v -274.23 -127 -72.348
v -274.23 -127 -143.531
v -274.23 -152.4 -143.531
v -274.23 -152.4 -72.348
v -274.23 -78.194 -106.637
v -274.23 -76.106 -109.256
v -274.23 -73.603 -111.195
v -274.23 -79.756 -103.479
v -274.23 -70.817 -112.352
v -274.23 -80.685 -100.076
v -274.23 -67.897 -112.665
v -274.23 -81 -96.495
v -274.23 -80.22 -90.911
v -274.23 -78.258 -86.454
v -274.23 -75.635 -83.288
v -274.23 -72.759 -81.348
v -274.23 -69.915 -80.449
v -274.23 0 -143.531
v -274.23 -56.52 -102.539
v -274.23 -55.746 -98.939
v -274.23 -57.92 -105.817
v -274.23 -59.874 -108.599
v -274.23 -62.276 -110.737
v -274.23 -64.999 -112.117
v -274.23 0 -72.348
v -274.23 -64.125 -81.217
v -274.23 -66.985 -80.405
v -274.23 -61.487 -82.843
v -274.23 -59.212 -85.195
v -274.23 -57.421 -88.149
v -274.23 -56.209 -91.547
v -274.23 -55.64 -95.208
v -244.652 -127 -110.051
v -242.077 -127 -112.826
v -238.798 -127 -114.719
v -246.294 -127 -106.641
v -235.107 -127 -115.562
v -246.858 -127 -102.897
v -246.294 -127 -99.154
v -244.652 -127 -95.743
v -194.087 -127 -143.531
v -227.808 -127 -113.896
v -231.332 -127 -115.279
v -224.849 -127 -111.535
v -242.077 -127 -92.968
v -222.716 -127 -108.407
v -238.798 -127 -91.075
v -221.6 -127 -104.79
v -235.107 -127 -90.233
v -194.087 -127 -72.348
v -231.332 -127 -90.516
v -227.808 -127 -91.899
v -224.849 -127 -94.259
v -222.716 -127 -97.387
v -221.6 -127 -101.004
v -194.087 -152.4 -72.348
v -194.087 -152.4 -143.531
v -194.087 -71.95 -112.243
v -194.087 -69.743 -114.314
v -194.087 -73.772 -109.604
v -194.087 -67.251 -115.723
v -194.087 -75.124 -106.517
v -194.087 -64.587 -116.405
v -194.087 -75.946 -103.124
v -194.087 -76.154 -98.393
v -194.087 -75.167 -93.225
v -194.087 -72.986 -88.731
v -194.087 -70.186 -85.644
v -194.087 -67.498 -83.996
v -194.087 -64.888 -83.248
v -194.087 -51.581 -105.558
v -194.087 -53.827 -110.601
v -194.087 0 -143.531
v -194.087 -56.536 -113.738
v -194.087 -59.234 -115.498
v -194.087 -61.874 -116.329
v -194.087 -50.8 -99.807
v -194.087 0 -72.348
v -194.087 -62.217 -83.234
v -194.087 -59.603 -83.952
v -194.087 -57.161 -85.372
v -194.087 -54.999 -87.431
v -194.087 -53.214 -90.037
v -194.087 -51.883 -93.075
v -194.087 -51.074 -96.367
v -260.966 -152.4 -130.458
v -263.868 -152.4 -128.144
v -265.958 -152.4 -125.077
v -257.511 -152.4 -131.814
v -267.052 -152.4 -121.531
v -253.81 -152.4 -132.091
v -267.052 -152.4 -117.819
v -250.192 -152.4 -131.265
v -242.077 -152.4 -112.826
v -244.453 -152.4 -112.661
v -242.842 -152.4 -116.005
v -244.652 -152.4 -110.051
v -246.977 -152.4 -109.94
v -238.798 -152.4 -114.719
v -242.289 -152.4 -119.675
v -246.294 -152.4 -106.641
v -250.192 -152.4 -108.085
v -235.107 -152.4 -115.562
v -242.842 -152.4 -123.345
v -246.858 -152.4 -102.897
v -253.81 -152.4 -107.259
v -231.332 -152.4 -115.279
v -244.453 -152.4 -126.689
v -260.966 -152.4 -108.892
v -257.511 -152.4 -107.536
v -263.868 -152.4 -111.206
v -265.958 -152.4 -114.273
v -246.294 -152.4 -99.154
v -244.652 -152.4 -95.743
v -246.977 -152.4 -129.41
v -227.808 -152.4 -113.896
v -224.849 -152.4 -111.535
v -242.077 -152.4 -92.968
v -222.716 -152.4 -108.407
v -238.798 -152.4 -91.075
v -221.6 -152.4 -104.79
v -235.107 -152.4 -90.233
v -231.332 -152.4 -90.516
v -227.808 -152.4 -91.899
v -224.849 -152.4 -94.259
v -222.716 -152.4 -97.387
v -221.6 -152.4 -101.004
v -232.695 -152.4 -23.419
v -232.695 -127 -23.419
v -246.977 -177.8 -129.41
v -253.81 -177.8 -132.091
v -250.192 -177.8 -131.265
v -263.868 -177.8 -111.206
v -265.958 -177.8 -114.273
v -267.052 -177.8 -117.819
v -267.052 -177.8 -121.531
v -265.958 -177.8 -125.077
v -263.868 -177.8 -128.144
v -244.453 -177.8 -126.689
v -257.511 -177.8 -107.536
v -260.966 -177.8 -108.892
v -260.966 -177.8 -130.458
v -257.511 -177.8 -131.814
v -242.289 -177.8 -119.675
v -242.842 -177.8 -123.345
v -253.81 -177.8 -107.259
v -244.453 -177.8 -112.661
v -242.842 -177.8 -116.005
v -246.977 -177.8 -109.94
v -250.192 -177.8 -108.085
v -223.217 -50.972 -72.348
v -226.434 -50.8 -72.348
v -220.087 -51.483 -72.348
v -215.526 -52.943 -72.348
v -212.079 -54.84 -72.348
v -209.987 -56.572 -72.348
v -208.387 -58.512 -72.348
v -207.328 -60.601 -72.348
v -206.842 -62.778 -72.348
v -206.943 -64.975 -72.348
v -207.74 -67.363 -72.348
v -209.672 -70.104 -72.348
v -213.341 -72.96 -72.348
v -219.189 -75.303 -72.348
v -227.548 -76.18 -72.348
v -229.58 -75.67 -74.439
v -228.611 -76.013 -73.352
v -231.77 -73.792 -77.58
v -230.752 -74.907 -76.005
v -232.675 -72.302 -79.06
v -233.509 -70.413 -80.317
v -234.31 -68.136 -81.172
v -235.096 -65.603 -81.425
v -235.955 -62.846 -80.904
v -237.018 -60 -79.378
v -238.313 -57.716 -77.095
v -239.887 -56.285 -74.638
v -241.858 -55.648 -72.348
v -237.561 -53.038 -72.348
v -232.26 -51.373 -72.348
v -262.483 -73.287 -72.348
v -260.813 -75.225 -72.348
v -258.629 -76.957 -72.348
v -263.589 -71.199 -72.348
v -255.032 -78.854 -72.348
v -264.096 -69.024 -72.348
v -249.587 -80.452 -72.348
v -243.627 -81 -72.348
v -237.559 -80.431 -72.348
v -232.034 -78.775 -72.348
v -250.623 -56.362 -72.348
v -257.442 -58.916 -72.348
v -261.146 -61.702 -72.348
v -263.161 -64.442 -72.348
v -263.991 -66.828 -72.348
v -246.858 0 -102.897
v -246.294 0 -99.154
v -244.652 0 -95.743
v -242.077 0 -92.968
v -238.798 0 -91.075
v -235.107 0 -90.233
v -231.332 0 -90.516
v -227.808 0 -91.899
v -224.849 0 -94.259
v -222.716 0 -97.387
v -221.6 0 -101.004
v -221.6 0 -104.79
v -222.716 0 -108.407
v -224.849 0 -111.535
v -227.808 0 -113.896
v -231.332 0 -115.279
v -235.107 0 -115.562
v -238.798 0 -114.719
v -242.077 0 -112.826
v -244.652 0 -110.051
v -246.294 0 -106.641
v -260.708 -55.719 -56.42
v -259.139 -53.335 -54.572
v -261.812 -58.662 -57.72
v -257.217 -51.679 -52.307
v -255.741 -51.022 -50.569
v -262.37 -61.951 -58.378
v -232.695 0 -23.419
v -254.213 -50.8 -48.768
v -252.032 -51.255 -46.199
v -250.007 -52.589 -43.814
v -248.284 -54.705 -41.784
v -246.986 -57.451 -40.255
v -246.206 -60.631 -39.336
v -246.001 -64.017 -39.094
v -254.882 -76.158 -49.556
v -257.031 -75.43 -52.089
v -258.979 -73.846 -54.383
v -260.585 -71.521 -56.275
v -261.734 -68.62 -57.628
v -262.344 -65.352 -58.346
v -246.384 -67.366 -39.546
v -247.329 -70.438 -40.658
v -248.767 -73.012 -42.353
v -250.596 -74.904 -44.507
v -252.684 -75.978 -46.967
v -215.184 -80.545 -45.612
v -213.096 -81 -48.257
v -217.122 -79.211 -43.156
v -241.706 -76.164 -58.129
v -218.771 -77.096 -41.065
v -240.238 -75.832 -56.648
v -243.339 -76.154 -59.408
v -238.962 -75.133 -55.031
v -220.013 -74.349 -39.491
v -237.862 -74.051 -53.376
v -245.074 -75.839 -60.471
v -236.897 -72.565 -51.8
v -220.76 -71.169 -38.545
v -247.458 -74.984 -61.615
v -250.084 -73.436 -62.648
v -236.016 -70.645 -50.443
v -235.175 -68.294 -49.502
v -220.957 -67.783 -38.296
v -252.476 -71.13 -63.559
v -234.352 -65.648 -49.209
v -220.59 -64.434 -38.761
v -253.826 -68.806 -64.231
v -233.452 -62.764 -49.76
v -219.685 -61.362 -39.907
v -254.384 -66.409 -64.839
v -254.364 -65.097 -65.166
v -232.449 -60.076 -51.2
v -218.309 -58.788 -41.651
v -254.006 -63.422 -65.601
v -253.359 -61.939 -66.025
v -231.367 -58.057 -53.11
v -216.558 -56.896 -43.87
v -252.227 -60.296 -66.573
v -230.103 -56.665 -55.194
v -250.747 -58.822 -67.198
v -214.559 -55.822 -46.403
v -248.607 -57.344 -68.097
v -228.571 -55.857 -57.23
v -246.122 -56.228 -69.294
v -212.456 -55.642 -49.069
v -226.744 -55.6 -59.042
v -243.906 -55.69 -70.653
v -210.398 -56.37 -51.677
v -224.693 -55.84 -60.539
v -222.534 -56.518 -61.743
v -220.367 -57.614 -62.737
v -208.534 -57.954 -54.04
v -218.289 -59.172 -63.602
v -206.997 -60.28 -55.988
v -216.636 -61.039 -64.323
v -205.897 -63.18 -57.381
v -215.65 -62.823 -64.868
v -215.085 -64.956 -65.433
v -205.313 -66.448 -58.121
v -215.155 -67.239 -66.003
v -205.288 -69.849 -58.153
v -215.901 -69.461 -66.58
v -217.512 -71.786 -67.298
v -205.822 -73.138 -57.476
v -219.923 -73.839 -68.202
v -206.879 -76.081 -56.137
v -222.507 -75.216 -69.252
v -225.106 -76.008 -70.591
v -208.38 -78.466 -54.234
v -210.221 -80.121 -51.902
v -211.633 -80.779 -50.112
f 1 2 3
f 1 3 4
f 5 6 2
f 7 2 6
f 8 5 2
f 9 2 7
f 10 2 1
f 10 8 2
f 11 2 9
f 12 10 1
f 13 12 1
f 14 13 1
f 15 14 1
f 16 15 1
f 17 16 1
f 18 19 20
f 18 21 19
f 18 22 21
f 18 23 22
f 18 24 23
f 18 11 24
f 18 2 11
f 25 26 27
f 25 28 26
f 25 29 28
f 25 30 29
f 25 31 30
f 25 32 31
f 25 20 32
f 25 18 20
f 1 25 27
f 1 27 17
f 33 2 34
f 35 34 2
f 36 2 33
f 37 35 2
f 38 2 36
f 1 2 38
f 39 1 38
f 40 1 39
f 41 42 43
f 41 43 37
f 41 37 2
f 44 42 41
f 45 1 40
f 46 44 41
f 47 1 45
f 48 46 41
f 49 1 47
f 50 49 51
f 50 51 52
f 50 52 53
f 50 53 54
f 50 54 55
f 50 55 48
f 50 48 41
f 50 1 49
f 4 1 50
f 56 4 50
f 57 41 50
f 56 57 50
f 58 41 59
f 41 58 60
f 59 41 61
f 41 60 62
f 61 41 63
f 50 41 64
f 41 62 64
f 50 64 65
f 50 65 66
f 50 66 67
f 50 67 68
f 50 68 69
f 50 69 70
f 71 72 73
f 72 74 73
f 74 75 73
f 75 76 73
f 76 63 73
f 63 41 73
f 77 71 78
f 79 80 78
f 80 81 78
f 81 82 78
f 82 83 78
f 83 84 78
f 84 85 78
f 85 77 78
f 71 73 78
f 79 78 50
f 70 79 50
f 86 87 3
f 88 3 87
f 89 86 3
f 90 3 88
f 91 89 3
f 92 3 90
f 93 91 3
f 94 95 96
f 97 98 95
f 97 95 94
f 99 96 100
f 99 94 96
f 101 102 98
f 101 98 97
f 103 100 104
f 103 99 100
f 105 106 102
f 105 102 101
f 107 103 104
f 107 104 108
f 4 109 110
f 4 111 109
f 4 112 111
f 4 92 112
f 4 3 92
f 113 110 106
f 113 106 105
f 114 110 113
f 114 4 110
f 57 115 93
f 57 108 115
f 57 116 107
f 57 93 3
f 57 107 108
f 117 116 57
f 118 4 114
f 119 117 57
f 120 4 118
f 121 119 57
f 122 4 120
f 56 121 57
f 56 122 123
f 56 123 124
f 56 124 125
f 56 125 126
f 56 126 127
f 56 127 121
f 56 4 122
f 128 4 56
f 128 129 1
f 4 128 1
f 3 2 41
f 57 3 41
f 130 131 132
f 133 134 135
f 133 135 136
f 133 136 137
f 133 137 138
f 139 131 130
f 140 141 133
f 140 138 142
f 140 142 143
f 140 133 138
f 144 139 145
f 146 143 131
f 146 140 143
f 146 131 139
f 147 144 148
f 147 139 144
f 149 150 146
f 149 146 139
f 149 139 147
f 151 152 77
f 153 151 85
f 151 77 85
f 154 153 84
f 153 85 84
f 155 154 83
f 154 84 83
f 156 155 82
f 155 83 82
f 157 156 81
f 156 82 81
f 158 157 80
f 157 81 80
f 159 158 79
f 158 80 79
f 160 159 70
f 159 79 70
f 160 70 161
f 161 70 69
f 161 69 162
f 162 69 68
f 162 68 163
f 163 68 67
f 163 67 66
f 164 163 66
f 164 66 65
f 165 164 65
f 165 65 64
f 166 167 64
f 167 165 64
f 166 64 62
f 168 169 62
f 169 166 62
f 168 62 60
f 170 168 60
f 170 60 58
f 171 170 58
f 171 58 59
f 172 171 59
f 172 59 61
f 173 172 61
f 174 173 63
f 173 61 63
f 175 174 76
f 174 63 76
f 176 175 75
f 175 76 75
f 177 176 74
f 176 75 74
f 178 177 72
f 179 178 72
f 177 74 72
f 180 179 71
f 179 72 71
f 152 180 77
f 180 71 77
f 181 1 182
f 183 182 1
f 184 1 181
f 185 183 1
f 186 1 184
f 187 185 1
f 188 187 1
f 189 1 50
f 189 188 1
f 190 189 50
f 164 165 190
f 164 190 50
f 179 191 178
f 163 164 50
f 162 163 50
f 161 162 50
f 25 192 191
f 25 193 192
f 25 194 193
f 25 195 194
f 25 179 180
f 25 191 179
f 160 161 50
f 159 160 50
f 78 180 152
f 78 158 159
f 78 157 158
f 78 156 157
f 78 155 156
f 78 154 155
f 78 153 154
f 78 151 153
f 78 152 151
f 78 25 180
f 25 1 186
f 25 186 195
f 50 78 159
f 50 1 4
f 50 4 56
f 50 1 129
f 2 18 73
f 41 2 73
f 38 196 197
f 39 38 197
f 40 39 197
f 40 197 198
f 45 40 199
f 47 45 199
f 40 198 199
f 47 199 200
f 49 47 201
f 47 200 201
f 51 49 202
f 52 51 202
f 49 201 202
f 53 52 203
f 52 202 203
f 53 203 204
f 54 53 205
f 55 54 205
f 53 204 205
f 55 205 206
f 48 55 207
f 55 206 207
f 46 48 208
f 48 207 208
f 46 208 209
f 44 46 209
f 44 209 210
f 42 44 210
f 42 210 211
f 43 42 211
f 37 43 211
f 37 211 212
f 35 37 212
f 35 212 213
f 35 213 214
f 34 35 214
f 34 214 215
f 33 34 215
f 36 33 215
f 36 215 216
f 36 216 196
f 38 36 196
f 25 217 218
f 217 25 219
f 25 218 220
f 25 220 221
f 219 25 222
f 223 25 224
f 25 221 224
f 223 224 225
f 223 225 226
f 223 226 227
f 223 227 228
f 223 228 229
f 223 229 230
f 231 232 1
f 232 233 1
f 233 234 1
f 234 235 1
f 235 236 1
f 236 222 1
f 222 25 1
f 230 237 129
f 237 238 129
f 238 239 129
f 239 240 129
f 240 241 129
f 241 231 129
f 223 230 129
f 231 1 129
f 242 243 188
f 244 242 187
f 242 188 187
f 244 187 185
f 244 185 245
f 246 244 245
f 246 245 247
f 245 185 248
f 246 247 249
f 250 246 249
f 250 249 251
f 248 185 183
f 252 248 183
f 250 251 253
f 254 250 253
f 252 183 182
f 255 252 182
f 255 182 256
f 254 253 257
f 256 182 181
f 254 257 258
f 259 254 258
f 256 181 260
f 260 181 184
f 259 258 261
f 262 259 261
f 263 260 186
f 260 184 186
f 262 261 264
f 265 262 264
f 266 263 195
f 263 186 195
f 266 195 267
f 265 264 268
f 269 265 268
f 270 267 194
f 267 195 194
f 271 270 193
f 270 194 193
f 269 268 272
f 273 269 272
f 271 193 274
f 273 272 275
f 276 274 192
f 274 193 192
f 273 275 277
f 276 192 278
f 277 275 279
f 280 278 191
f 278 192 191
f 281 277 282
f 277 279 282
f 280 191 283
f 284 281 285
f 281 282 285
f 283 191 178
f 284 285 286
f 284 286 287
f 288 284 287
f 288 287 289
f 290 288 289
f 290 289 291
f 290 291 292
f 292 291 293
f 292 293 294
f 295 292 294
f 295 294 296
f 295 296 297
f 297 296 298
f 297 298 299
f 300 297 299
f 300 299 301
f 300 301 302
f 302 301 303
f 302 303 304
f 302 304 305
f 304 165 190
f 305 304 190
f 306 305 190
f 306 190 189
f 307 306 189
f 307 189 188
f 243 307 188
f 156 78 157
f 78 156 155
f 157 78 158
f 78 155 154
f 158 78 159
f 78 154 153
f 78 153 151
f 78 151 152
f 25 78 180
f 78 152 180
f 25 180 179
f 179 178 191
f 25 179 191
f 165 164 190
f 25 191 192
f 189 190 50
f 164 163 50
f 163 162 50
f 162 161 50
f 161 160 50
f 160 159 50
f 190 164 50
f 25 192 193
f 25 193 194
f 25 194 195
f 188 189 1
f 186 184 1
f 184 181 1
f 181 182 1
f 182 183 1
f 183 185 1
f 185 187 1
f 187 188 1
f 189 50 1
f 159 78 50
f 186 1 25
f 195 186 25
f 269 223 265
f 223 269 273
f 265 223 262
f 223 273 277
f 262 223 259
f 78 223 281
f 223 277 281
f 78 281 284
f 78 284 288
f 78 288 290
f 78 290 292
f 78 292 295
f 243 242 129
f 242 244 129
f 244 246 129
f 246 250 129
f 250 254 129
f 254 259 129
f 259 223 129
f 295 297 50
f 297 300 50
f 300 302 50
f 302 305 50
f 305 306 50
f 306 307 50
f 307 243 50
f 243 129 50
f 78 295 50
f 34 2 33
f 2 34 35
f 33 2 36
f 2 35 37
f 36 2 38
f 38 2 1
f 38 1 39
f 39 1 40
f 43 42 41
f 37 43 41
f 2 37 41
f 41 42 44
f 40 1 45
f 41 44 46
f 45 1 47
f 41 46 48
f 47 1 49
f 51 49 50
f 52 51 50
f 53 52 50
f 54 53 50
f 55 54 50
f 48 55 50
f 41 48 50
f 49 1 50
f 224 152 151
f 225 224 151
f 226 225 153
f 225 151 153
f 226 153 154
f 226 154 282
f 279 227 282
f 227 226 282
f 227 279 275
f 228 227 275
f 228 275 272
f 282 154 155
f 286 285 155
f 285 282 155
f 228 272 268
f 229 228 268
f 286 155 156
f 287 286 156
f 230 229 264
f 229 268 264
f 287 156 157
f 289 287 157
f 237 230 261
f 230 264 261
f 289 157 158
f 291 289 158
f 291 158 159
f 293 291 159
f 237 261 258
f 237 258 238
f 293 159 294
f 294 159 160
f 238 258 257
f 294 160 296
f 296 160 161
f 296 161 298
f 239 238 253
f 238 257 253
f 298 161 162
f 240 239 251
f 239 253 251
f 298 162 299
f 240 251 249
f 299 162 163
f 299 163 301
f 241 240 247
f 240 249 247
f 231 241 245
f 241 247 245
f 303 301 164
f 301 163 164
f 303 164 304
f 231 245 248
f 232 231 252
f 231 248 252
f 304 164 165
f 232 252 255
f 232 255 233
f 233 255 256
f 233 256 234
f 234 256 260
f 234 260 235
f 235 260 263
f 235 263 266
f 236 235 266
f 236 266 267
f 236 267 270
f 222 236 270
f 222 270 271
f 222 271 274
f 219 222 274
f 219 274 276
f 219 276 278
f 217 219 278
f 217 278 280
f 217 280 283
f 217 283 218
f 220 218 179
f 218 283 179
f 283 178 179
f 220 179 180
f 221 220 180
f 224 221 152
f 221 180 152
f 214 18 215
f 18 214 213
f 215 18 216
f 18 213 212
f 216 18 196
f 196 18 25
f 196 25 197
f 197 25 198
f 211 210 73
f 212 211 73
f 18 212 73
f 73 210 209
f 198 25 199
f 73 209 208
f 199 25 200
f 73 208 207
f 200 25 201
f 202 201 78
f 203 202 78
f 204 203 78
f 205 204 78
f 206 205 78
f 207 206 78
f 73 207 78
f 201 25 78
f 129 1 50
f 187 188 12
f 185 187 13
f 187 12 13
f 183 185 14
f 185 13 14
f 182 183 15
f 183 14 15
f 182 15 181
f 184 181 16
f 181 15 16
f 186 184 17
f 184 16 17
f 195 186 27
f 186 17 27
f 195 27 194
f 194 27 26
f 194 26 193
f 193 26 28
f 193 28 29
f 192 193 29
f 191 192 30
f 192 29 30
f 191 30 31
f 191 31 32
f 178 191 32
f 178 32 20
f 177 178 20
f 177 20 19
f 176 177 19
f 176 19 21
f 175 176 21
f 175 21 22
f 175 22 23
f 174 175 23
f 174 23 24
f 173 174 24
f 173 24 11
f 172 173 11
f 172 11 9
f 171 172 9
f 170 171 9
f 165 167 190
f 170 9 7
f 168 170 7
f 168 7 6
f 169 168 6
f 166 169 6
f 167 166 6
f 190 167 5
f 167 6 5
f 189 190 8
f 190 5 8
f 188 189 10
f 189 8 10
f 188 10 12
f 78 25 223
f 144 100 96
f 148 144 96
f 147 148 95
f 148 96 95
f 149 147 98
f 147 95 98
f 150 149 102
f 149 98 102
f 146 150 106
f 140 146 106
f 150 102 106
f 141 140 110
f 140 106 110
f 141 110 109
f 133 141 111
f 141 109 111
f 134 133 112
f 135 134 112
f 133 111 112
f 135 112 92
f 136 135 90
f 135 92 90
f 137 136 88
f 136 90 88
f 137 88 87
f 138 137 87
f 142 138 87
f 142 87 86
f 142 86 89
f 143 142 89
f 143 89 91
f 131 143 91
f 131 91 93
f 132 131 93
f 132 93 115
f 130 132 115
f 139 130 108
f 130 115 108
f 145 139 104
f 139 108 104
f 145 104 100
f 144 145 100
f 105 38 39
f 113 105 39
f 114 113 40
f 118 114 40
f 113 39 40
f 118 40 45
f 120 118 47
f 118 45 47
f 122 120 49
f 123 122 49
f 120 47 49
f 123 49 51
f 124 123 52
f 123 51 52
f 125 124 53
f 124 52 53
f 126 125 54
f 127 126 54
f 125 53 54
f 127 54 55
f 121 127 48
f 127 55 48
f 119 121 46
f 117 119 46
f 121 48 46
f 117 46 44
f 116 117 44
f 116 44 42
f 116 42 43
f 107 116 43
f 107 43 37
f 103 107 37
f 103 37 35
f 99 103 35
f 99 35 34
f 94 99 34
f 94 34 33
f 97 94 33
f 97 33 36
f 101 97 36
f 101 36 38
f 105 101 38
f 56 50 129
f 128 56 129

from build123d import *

# Parameters (mm, degrees)
F0_W        = 80.142647
F0_H        = 71.18237
F1_DEPTH    = 127
F3_DEPTH    = 25.4
F4_DEPTH    = 127
F1_FACE_W   = 80.142648
F1_FACE_H   = 71.18237
F5_DEPTH    = 25.4
F6_R        = 12.451084
F7_DEPTH    = 25.4
F9_D        = 25.4
F9_DEPTH    = 254
F9_2_D      = 25.4
F9_2_DEPTH  = 254
F11_D       = 25.4
F11_DEPTH   = 254
F11_2_D     = 25.4
F11_2_DEPTH = 254
F13_D       = 25.4
F13_DEPTH   = 254
F13_2_D     = 25.4
F13_2_DEPTH = 254


with BuildPart() as f1:
    # F0 (on Front) → F1 (new body)
    with BuildSketch(Plane.XZ):
        with Locations((-234.158322, -107.939616)):
            Rectangle(F0_W, F0_H)
    extrude(amount=F1_DEPTH)

    # F9
    with Locations(Plane.XZ.offset(152.4)):
        with Locations((-234.158322, -102.897115)):
            Hole(F9_D / 2, depth=F9_DEPTH)

    # F11
    with Locations(Plane(origin=(-154.796126, 0, -122.143098), x_dir=(0, 1, 0), z_dir=(0.785042, 0, 0.619443))):
        with Locations((-68.300158, 94.116807)):
            Hole(F11_D / 2, depth=F11_DEPTH)

    # F13
    with Locations(Plane(origin=(-123.686219, 0, 104.994907), x_dir=(0, -1, 0), z_dir=(-0.76236, 0, 0.647153))):
        with Locations((63.5, -201.693207)):
            Hole(F13_D / 2, depth=F13_DEPTH)


with BuildPart() as f3:
    # F2 (on face) → F3 (new body)
    with BuildSketch(Plane.XZ.offset(127)):
        Polygon((-232.694775, -23.419475), (-274.229646, -72.348431), (-194.086999, -72.348431), align=None)
    extrude(amount=F3_DEPTH)


with BuildPart() as f4:
    # F3_face (on face) → F4 (new body)
    with BuildSketch(Plane(origin=(-233.670473, -127, -56.038779), x_dir=(1, 0, 0), z_dir=(0, 1, 0))):
        Polygon((-40.559173, 16.309652), (0.975698, -32.619304), (39.583474, 16.309652), align=None)
    extrude(amount=F4_DEPTH)

    # F11#2
    with Locations(Plane(origin=(-154.796126, 0, -122.143098), x_dir=(0, 1, 0), z_dir=(0.785042, 0, 0.619443))):
        with Locations((-68.300158, 94.116807)):
            Hole(F11_2_D / 2, depth=F11_2_DEPTH)

    # F13#2
    with Locations(Plane(origin=(-123.686219, 0, 104.994907), x_dir=(0, -1, 0), z_dir=(-0.76236, 0, 0.647153))):
        with Locations((63.5, -201.693207)):
            Hole(F13_2_D / 2, depth=F13_2_DEPTH)


with BuildPart() as f5:
    # F1_face (on face) → F5 (new body)
    with BuildSketch(Plane(origin=(-234.158322, -127, -107.939616), x_dir=(1, 0, 0), z_dir=(0, -1, 0))):
        Rectangle(F1_FACE_W, F1_FACE_H)
    extrude(amount=F5_DEPTH)

    # F6 (on face) → F7 (join)
    with BuildSketch(Plane.XZ.offset(152.4)):
        with Locations((-254.740417, -119.67507)):
            Circle(F6_R)
    extrude(amount=F7_DEPTH)

    # F9#2
    with Locations(Plane.XZ.offset(152.4)):
        with Locations((-234.158322, -102.897115)):
            Hole(F9_2_D / 2, depth=F9_2_DEPTH)


solid = Compound([f1.part, f3.part, f4.part, f5.part])
